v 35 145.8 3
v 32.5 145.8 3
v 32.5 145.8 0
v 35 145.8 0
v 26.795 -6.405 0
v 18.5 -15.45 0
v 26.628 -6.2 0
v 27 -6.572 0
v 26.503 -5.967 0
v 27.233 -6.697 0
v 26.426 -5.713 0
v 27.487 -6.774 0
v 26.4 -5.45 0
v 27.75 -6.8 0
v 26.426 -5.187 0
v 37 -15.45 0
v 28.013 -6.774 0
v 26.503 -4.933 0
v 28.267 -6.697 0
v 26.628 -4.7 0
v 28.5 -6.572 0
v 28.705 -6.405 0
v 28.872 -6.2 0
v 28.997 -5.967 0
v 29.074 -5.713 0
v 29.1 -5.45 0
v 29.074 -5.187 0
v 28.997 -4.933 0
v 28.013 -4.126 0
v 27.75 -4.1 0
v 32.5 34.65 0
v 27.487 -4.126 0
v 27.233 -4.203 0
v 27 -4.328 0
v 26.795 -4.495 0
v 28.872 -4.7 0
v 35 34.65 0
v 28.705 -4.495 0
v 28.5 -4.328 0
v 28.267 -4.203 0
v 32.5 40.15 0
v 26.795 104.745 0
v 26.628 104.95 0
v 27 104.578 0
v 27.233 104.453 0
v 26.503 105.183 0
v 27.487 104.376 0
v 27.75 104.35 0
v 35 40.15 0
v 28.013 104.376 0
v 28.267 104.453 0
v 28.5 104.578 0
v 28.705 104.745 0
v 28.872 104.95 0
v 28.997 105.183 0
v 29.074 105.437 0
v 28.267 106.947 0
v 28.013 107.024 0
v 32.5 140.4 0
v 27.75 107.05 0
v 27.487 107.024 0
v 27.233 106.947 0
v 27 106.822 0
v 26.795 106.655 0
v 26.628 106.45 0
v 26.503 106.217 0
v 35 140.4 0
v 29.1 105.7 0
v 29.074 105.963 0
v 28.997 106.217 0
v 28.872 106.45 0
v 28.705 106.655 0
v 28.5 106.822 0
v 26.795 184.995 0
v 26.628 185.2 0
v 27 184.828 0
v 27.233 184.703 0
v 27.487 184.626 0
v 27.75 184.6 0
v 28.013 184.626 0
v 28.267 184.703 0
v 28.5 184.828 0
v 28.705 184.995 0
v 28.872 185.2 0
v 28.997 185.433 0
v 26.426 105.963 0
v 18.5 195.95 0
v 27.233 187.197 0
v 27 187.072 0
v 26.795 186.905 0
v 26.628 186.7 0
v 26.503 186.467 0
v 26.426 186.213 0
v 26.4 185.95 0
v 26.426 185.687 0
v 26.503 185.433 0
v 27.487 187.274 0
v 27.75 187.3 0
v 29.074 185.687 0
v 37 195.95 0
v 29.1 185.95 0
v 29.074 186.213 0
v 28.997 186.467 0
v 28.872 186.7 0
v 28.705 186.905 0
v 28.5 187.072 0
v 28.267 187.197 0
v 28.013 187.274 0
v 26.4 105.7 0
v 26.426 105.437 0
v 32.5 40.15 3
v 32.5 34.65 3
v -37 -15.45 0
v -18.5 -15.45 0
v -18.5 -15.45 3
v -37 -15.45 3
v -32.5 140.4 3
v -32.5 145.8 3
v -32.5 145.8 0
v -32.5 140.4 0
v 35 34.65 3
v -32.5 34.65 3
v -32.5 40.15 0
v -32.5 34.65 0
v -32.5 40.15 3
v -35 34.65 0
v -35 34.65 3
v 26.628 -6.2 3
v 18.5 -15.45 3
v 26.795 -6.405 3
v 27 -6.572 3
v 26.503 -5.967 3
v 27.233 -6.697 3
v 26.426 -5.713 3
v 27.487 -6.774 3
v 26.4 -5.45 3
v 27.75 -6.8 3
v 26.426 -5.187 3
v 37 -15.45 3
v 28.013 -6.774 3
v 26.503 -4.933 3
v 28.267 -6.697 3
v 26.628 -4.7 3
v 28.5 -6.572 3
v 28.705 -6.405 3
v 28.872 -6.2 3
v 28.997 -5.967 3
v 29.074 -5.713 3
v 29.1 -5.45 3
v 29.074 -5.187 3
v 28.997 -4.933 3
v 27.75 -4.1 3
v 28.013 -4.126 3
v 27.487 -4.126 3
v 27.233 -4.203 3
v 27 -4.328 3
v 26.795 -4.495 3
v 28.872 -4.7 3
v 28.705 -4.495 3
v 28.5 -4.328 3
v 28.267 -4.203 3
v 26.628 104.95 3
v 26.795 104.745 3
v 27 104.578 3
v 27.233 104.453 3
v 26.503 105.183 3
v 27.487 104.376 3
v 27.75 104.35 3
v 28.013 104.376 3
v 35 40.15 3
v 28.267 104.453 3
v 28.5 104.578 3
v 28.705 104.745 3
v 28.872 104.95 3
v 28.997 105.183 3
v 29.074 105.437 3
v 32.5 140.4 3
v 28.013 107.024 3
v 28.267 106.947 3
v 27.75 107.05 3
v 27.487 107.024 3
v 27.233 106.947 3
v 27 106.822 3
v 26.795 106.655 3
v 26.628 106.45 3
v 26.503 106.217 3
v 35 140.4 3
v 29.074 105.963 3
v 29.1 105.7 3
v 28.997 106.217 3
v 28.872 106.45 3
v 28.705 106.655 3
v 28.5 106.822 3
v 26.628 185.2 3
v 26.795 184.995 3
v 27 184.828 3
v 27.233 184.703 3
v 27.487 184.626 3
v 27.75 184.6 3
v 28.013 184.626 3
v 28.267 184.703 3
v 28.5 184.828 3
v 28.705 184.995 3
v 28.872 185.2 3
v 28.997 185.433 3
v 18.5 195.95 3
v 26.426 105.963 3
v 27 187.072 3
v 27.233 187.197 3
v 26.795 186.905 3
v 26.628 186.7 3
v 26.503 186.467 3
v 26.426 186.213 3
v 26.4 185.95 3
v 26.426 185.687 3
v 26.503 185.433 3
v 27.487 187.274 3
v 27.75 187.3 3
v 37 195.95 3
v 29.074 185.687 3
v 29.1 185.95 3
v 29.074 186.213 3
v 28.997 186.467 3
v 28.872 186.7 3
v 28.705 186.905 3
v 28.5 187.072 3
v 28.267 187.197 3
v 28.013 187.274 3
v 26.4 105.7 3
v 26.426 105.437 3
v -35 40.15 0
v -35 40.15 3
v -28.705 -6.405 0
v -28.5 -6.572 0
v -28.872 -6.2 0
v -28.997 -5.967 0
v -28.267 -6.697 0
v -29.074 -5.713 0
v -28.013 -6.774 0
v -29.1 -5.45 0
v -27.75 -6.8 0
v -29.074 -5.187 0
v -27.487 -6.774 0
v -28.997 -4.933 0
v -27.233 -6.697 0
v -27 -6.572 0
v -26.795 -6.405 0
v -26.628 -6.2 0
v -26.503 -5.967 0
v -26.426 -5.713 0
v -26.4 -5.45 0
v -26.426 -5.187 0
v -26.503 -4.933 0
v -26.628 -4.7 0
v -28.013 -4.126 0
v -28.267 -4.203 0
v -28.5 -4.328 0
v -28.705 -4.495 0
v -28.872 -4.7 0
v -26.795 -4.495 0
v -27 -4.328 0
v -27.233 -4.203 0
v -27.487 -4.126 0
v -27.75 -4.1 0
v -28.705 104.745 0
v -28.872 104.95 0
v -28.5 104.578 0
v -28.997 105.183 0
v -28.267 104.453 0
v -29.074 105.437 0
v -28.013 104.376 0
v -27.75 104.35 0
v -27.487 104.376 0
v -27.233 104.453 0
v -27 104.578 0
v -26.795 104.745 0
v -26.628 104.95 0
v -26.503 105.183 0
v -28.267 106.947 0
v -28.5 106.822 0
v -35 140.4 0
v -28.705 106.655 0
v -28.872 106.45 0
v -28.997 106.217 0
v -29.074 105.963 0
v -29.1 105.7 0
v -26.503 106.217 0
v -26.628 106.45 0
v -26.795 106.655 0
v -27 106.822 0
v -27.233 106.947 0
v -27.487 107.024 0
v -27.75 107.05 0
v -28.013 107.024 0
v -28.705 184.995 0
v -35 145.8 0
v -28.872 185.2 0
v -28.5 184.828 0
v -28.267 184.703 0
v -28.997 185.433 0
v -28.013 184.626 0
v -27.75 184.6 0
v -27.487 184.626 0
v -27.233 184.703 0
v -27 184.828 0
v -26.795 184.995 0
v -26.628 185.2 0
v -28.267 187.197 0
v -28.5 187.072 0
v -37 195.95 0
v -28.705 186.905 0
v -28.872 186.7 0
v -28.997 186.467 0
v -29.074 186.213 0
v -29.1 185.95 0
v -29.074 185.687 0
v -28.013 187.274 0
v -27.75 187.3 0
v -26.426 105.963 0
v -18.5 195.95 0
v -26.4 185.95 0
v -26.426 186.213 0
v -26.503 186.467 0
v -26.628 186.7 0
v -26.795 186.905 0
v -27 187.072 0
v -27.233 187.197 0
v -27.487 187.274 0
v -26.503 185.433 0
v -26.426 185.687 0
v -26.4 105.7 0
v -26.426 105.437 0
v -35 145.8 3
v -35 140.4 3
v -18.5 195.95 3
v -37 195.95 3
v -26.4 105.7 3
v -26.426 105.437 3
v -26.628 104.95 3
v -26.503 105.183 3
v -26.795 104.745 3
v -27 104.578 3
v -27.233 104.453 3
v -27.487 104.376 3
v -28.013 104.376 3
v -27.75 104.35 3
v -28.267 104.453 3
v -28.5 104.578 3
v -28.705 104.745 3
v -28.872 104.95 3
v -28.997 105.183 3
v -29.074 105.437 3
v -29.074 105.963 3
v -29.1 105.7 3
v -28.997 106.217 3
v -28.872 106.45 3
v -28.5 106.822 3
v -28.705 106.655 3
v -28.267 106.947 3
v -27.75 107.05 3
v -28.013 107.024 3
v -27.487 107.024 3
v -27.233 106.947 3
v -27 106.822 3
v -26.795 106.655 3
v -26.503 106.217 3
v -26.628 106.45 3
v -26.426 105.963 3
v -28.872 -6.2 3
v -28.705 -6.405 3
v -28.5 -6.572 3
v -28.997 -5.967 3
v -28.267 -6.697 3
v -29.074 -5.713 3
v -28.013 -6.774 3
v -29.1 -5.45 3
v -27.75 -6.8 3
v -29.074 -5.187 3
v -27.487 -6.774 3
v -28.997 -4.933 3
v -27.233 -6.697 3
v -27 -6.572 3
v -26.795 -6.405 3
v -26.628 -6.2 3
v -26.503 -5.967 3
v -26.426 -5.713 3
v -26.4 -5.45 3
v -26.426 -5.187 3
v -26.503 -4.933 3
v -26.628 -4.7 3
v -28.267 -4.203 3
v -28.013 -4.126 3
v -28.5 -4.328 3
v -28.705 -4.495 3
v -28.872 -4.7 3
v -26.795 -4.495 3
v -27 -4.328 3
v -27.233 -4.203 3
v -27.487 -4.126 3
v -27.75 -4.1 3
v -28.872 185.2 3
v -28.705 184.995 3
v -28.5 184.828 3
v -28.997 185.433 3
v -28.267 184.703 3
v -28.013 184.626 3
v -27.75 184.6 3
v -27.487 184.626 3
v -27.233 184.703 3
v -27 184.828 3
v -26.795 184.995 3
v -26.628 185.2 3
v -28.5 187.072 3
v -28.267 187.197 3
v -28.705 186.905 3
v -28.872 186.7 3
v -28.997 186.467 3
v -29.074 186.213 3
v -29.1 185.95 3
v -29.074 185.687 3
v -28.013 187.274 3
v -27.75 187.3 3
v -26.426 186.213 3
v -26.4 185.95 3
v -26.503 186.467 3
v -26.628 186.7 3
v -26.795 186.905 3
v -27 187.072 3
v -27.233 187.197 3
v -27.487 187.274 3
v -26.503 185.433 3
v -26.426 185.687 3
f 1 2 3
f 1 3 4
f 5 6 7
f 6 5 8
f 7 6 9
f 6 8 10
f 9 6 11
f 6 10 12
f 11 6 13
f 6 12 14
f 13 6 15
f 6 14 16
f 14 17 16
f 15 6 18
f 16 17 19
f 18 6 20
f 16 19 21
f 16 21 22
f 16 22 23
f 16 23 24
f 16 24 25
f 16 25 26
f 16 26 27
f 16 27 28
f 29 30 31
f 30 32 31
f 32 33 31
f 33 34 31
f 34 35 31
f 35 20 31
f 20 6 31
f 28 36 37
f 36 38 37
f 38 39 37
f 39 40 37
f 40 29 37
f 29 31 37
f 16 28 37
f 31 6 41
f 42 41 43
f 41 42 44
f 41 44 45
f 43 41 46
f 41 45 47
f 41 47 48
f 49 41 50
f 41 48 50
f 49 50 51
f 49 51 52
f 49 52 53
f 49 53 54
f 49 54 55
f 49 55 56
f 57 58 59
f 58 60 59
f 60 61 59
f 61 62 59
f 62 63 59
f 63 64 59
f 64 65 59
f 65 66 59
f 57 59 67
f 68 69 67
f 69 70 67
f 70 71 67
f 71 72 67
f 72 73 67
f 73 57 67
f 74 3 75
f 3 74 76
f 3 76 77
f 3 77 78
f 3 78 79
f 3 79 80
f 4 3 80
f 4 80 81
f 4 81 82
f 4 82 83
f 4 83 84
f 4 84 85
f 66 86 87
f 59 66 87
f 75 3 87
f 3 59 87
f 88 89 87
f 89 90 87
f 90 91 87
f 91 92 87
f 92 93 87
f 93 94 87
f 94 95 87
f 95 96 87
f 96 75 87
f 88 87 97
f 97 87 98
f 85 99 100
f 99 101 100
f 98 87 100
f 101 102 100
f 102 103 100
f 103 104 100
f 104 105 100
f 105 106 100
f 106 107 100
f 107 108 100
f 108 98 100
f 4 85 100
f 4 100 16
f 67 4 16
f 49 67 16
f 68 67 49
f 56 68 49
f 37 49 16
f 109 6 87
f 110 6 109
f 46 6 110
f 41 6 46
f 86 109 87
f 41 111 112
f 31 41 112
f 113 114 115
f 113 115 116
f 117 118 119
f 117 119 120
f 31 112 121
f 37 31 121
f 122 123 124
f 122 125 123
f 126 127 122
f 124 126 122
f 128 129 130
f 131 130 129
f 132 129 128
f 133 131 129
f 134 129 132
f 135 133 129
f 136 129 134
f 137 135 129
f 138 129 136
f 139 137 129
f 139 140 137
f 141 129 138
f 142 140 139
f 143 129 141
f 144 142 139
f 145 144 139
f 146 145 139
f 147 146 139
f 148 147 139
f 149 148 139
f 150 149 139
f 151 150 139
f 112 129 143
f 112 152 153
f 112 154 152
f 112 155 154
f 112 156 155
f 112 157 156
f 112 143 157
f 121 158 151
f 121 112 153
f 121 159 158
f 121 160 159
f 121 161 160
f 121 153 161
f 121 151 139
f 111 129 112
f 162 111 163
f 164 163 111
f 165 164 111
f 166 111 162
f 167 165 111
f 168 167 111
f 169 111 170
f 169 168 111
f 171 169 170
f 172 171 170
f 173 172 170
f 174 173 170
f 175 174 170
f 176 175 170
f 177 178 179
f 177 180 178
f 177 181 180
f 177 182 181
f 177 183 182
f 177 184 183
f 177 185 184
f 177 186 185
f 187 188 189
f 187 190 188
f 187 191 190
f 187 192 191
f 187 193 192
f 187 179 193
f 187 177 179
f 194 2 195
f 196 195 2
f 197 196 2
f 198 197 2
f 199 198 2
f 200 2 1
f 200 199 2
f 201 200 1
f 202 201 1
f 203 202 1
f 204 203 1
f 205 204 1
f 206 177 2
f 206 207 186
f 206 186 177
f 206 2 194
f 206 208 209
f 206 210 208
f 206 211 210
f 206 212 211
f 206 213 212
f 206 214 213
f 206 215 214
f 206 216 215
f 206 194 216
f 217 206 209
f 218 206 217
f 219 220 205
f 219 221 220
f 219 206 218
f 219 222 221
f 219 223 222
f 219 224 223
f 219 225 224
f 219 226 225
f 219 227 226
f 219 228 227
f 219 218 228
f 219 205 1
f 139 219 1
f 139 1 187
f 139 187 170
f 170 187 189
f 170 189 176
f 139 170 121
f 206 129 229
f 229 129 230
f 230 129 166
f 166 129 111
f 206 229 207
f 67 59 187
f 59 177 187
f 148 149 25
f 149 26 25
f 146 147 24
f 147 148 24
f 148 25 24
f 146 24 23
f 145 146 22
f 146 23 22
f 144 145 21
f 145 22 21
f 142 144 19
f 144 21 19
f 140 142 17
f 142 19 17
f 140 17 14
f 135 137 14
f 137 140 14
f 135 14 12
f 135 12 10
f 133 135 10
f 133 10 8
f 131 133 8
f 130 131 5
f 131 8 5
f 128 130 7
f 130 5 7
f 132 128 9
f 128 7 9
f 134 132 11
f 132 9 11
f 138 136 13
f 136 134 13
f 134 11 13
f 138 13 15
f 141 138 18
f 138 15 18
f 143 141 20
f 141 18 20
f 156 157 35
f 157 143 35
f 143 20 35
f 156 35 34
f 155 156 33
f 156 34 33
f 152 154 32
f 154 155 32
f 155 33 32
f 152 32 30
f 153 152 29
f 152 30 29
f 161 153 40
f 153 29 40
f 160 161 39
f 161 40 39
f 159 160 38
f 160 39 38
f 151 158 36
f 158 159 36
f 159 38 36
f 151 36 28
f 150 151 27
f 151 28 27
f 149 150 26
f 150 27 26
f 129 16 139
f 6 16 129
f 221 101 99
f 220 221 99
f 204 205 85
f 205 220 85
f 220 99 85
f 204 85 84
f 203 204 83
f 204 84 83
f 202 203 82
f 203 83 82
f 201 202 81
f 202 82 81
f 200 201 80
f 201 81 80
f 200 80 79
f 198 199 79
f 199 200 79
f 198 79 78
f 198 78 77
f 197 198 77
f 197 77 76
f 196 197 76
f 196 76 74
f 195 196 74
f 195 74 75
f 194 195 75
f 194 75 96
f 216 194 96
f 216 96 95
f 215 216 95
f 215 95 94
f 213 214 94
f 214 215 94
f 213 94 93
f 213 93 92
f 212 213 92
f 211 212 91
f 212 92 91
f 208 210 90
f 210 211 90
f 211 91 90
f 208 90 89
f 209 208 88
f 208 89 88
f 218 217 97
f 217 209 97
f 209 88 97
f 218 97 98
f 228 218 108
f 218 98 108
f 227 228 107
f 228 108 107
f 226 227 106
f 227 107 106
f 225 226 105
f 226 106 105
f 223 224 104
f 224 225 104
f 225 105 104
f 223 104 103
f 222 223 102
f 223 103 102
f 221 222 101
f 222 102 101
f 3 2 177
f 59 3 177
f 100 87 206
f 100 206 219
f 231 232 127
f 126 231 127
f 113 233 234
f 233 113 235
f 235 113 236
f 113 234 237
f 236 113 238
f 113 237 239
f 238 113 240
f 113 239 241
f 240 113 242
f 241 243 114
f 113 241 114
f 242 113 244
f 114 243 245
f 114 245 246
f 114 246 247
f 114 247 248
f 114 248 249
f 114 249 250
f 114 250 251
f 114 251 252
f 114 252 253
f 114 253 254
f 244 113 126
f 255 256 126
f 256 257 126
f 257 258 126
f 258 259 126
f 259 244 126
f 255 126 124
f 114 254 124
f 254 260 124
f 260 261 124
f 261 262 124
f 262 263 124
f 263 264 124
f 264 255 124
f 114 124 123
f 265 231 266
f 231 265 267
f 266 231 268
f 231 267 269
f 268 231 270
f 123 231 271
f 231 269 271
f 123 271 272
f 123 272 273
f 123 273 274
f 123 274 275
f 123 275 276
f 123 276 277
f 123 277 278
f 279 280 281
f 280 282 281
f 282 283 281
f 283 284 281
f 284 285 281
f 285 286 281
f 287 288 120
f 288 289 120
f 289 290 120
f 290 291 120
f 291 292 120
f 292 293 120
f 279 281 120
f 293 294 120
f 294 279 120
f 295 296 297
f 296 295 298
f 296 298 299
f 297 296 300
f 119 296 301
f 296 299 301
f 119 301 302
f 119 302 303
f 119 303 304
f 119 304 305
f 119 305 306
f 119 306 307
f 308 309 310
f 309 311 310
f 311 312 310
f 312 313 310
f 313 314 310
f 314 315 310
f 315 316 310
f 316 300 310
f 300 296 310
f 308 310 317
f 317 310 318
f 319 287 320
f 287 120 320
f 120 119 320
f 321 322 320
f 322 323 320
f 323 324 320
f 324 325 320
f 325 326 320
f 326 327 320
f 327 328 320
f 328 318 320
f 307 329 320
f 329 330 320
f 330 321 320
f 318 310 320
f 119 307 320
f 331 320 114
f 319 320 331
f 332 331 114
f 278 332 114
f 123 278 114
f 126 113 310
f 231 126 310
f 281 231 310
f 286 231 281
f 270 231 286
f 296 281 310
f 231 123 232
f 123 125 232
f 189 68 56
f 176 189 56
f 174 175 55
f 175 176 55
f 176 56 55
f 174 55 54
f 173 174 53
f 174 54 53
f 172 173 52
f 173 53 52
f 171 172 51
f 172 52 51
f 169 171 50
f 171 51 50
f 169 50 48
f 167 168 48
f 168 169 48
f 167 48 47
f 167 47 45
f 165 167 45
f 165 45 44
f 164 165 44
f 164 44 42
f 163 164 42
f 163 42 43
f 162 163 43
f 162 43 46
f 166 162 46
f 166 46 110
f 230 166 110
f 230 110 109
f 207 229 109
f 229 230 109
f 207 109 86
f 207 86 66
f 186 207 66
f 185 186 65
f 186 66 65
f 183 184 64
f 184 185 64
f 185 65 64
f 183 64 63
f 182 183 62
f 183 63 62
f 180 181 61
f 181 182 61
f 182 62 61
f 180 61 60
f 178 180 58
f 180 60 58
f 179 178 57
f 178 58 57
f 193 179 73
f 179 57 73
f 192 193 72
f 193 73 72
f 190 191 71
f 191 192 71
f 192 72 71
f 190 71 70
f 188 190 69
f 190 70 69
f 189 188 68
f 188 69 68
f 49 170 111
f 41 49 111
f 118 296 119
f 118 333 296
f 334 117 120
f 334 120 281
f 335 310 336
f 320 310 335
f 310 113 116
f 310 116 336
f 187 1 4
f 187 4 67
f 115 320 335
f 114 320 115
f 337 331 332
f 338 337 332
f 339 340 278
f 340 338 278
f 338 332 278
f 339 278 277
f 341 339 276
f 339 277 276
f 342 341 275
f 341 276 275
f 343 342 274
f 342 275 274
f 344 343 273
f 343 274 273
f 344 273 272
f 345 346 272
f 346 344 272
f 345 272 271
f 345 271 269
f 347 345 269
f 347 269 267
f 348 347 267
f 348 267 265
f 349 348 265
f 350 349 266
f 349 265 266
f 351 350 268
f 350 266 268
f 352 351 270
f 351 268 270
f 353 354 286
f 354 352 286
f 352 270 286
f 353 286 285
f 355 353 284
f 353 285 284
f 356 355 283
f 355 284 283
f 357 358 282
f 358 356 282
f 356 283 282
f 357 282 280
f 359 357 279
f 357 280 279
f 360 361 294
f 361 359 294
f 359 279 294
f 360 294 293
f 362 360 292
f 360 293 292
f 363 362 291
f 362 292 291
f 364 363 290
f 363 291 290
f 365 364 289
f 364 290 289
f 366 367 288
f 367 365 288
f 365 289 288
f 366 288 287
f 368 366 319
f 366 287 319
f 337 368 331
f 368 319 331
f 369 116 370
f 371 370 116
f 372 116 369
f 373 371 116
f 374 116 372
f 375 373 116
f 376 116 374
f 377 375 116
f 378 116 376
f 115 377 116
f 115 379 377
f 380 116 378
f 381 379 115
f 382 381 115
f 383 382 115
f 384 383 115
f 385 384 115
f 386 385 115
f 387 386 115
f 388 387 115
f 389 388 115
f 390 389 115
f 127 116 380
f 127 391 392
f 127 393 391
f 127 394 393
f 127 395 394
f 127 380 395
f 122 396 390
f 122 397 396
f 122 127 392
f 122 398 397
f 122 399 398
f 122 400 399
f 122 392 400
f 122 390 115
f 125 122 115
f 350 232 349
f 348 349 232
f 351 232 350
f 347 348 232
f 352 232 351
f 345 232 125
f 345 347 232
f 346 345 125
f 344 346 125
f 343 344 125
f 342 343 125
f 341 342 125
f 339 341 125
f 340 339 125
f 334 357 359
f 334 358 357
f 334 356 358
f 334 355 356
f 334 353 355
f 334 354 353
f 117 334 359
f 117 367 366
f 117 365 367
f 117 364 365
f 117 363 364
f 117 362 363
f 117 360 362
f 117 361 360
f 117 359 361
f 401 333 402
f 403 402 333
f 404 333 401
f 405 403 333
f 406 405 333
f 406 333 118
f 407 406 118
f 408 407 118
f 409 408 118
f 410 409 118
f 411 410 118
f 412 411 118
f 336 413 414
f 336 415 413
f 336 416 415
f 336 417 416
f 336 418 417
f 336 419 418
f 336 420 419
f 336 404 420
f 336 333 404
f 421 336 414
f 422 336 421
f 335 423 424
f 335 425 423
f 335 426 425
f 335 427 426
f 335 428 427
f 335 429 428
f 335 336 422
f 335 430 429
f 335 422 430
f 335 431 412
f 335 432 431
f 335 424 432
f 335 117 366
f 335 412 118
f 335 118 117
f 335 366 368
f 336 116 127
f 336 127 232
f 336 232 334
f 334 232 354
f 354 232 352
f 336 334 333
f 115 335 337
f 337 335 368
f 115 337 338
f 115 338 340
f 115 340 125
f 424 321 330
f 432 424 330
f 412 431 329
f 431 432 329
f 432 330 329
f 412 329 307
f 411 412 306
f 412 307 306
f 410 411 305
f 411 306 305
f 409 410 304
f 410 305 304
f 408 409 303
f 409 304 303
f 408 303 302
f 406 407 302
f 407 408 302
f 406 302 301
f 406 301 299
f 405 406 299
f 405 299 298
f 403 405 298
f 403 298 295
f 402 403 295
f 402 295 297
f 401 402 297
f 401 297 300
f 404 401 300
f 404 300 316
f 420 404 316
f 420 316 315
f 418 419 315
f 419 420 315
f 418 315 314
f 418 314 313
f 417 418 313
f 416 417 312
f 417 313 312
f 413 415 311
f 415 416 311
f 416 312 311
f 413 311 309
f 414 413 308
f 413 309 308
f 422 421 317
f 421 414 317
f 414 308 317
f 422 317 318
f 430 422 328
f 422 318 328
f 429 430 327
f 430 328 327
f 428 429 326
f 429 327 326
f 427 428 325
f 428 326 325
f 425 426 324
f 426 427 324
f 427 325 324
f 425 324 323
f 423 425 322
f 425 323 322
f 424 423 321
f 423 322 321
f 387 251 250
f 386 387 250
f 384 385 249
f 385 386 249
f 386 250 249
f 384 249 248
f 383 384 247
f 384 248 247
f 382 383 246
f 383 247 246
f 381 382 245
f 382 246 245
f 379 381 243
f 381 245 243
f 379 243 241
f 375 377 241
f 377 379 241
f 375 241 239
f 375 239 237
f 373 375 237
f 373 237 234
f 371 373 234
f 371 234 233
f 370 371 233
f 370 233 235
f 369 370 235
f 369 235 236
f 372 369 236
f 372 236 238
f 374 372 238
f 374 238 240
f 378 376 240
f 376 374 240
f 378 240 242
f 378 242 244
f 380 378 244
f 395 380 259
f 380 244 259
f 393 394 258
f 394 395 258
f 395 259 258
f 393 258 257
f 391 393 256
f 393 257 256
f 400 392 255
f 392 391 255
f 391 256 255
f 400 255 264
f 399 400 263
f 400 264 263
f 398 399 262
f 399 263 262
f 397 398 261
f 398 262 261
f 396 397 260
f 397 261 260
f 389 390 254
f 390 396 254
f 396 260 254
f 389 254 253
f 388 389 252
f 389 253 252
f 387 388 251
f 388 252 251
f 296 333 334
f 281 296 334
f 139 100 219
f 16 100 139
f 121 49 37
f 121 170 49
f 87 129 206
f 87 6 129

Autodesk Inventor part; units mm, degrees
ref_plane "YZ Plane" through (0, 0, 0) normal (1, 0, 0) x (0, 1, 0)
ref_plane "XZ Plane" through (0, 0, 0) normal (0, 1, 0) x (-1, 0, 0)
ref_plane "XY Plane" through (0, 0, 0) normal (0, 0, 1) x (1, 0, 0)
sketch "Sketch1" plane through (0, 0, 0) normal (0, 0, 1) x (1, 0, 0)
  line L0 (-18.5, 195.95) -> (18.5, 195.95) construction
  line L1 (18.5, 195.95) -> (18.5, -15.45) construction
  line L2 (18.5, -15.45) -> (-18.5, -15.45) construction
  line L3 (-18.5, -15.45) -> (-18.5, 195.95) construction
  line L4 (-18.5, 195.95) -> (18.5, -15.45) construction
  line L5 (18.5, 195.95) -> (-18.5, -15.45) construction
  line L6 (18.5, 195.95) -> (37, 195.95)
  line L7 (37, 195.95) -> (37, -15.45)
  line L8 (37, -15.45) -> (18.5, -15.45)
  line L9 (18.5, -15.45) -> (18.5, 195.95)
  line L10 (0, -57.73) -> (0, 238.23) construction
  line L11 (-18.5, -15.45) -> (-37, -15.45)
  line L12 (-37, -15.45) -> (-37, 195.95)
  line L13 (-37, 195.95) -> (-18.5, 195.95)
  line L14 (-18.5, 195.95) -> (-18.5, -15.45)
  circle A0 centre (27.75, 185.95) radius 1.35
  circle A1 centre (-27.75, 185.95) radius 1.35
  circle A2 centre (27.75, -5.45) radius 1.35
  circle A3 centre (-27.75, -5.45) radius 1.35
  circle A4 centre (27.75, 105.7) radius 1.35
  circle A5 centre (-27.75, 105.7) radius 1.35
  point P0 (0, 0)
  point P1 (0, 90.25)
  point P2 (0, 90.25)
  dimension "d0" = 37
  dimension "d1" = 211.4
  dimension "d2" = 18.5
  dimension "d3" = 18.5
  dimension "d6" = 2.7
  dimension "d7" = 2.7
  dimension "d8" = 10
  dimension "d9" = 10
  dimension "d10" = 9.25
  dimension "d11" = 9.25
  dimension "d12" = 2.7
  dimension "d13" = 2.7
  dimension "d14" = 10
  dimension "d15" = 10
  dimension "d16" = 9.25
  dimension "d17" = 9.25
  dimension "d18" = 2.7
  dimension "d19" = 2.7
  dimension "d20" = 9.25
  dimension "d21" = 9.25
  dimension "d22" = 90.25
  dimension "d23" = 90.25
extrude "Extrusion1" add sketch "Sketch1" along normal blind 3
sketch "Sketch2" plane through (0, 0, 3) normal (0, 0, 1) x (1, 0, 0)
  line L0 (35, 40.15) -> (32.5, 40.15) projected
  line L1 (32.5, 34.65) -> (35, 34.65) projected
  line L2 (-32.5, 40.15) -> (-35, 40.15) projected
  line L3 (-35, 34.65) -> (-32.5, 34.65) projected
  line L4 (-32.5, 140.4) -> (-35, 140.4) projected
  line L5 (-35, 145.8) -> (-32.5, 145.8) projected
  line L6 (32.5, 145.8) -> (35, 145.8) projected
  line L7 (32.5, 140.4) -> (35, 140.4) projected
  line L8 (35, 145.8) -> (35, 140.4)
  line L9 (37, -15.45) -> (37, 195.95) projected
  line L10 (32.5, 145.8) -> (32.5, 140.4)
  line L11 (-32.5, 145.8) -> (-32.5, 140.4)
  line L12 (-35, 145.8) -> (-35, 140.4)
  line L13 (-32.5, 40.15) -> (-32.5, 34.65)
  line L14 (-35, 40.15) -> (-35, 34.65)
  line L15 (35, 40.15) -> (35, 34.65)
  line L16 (32.5, 40.15) -> (32.5, 34.65)
  point P0 (0, 0)
extrude "Extrusion2" cut sketch "Sketch2" against normal blind 10
equation "\"d2\" = 0.5 * d0"
equation "\"d3\" = d2"
equation "\"d10\" = 0.5 * d3"
equation "\"d11\" = 0.5 * d2"
equation "\"d22\" = d23"
properties part number "axis-holder_front-front"
